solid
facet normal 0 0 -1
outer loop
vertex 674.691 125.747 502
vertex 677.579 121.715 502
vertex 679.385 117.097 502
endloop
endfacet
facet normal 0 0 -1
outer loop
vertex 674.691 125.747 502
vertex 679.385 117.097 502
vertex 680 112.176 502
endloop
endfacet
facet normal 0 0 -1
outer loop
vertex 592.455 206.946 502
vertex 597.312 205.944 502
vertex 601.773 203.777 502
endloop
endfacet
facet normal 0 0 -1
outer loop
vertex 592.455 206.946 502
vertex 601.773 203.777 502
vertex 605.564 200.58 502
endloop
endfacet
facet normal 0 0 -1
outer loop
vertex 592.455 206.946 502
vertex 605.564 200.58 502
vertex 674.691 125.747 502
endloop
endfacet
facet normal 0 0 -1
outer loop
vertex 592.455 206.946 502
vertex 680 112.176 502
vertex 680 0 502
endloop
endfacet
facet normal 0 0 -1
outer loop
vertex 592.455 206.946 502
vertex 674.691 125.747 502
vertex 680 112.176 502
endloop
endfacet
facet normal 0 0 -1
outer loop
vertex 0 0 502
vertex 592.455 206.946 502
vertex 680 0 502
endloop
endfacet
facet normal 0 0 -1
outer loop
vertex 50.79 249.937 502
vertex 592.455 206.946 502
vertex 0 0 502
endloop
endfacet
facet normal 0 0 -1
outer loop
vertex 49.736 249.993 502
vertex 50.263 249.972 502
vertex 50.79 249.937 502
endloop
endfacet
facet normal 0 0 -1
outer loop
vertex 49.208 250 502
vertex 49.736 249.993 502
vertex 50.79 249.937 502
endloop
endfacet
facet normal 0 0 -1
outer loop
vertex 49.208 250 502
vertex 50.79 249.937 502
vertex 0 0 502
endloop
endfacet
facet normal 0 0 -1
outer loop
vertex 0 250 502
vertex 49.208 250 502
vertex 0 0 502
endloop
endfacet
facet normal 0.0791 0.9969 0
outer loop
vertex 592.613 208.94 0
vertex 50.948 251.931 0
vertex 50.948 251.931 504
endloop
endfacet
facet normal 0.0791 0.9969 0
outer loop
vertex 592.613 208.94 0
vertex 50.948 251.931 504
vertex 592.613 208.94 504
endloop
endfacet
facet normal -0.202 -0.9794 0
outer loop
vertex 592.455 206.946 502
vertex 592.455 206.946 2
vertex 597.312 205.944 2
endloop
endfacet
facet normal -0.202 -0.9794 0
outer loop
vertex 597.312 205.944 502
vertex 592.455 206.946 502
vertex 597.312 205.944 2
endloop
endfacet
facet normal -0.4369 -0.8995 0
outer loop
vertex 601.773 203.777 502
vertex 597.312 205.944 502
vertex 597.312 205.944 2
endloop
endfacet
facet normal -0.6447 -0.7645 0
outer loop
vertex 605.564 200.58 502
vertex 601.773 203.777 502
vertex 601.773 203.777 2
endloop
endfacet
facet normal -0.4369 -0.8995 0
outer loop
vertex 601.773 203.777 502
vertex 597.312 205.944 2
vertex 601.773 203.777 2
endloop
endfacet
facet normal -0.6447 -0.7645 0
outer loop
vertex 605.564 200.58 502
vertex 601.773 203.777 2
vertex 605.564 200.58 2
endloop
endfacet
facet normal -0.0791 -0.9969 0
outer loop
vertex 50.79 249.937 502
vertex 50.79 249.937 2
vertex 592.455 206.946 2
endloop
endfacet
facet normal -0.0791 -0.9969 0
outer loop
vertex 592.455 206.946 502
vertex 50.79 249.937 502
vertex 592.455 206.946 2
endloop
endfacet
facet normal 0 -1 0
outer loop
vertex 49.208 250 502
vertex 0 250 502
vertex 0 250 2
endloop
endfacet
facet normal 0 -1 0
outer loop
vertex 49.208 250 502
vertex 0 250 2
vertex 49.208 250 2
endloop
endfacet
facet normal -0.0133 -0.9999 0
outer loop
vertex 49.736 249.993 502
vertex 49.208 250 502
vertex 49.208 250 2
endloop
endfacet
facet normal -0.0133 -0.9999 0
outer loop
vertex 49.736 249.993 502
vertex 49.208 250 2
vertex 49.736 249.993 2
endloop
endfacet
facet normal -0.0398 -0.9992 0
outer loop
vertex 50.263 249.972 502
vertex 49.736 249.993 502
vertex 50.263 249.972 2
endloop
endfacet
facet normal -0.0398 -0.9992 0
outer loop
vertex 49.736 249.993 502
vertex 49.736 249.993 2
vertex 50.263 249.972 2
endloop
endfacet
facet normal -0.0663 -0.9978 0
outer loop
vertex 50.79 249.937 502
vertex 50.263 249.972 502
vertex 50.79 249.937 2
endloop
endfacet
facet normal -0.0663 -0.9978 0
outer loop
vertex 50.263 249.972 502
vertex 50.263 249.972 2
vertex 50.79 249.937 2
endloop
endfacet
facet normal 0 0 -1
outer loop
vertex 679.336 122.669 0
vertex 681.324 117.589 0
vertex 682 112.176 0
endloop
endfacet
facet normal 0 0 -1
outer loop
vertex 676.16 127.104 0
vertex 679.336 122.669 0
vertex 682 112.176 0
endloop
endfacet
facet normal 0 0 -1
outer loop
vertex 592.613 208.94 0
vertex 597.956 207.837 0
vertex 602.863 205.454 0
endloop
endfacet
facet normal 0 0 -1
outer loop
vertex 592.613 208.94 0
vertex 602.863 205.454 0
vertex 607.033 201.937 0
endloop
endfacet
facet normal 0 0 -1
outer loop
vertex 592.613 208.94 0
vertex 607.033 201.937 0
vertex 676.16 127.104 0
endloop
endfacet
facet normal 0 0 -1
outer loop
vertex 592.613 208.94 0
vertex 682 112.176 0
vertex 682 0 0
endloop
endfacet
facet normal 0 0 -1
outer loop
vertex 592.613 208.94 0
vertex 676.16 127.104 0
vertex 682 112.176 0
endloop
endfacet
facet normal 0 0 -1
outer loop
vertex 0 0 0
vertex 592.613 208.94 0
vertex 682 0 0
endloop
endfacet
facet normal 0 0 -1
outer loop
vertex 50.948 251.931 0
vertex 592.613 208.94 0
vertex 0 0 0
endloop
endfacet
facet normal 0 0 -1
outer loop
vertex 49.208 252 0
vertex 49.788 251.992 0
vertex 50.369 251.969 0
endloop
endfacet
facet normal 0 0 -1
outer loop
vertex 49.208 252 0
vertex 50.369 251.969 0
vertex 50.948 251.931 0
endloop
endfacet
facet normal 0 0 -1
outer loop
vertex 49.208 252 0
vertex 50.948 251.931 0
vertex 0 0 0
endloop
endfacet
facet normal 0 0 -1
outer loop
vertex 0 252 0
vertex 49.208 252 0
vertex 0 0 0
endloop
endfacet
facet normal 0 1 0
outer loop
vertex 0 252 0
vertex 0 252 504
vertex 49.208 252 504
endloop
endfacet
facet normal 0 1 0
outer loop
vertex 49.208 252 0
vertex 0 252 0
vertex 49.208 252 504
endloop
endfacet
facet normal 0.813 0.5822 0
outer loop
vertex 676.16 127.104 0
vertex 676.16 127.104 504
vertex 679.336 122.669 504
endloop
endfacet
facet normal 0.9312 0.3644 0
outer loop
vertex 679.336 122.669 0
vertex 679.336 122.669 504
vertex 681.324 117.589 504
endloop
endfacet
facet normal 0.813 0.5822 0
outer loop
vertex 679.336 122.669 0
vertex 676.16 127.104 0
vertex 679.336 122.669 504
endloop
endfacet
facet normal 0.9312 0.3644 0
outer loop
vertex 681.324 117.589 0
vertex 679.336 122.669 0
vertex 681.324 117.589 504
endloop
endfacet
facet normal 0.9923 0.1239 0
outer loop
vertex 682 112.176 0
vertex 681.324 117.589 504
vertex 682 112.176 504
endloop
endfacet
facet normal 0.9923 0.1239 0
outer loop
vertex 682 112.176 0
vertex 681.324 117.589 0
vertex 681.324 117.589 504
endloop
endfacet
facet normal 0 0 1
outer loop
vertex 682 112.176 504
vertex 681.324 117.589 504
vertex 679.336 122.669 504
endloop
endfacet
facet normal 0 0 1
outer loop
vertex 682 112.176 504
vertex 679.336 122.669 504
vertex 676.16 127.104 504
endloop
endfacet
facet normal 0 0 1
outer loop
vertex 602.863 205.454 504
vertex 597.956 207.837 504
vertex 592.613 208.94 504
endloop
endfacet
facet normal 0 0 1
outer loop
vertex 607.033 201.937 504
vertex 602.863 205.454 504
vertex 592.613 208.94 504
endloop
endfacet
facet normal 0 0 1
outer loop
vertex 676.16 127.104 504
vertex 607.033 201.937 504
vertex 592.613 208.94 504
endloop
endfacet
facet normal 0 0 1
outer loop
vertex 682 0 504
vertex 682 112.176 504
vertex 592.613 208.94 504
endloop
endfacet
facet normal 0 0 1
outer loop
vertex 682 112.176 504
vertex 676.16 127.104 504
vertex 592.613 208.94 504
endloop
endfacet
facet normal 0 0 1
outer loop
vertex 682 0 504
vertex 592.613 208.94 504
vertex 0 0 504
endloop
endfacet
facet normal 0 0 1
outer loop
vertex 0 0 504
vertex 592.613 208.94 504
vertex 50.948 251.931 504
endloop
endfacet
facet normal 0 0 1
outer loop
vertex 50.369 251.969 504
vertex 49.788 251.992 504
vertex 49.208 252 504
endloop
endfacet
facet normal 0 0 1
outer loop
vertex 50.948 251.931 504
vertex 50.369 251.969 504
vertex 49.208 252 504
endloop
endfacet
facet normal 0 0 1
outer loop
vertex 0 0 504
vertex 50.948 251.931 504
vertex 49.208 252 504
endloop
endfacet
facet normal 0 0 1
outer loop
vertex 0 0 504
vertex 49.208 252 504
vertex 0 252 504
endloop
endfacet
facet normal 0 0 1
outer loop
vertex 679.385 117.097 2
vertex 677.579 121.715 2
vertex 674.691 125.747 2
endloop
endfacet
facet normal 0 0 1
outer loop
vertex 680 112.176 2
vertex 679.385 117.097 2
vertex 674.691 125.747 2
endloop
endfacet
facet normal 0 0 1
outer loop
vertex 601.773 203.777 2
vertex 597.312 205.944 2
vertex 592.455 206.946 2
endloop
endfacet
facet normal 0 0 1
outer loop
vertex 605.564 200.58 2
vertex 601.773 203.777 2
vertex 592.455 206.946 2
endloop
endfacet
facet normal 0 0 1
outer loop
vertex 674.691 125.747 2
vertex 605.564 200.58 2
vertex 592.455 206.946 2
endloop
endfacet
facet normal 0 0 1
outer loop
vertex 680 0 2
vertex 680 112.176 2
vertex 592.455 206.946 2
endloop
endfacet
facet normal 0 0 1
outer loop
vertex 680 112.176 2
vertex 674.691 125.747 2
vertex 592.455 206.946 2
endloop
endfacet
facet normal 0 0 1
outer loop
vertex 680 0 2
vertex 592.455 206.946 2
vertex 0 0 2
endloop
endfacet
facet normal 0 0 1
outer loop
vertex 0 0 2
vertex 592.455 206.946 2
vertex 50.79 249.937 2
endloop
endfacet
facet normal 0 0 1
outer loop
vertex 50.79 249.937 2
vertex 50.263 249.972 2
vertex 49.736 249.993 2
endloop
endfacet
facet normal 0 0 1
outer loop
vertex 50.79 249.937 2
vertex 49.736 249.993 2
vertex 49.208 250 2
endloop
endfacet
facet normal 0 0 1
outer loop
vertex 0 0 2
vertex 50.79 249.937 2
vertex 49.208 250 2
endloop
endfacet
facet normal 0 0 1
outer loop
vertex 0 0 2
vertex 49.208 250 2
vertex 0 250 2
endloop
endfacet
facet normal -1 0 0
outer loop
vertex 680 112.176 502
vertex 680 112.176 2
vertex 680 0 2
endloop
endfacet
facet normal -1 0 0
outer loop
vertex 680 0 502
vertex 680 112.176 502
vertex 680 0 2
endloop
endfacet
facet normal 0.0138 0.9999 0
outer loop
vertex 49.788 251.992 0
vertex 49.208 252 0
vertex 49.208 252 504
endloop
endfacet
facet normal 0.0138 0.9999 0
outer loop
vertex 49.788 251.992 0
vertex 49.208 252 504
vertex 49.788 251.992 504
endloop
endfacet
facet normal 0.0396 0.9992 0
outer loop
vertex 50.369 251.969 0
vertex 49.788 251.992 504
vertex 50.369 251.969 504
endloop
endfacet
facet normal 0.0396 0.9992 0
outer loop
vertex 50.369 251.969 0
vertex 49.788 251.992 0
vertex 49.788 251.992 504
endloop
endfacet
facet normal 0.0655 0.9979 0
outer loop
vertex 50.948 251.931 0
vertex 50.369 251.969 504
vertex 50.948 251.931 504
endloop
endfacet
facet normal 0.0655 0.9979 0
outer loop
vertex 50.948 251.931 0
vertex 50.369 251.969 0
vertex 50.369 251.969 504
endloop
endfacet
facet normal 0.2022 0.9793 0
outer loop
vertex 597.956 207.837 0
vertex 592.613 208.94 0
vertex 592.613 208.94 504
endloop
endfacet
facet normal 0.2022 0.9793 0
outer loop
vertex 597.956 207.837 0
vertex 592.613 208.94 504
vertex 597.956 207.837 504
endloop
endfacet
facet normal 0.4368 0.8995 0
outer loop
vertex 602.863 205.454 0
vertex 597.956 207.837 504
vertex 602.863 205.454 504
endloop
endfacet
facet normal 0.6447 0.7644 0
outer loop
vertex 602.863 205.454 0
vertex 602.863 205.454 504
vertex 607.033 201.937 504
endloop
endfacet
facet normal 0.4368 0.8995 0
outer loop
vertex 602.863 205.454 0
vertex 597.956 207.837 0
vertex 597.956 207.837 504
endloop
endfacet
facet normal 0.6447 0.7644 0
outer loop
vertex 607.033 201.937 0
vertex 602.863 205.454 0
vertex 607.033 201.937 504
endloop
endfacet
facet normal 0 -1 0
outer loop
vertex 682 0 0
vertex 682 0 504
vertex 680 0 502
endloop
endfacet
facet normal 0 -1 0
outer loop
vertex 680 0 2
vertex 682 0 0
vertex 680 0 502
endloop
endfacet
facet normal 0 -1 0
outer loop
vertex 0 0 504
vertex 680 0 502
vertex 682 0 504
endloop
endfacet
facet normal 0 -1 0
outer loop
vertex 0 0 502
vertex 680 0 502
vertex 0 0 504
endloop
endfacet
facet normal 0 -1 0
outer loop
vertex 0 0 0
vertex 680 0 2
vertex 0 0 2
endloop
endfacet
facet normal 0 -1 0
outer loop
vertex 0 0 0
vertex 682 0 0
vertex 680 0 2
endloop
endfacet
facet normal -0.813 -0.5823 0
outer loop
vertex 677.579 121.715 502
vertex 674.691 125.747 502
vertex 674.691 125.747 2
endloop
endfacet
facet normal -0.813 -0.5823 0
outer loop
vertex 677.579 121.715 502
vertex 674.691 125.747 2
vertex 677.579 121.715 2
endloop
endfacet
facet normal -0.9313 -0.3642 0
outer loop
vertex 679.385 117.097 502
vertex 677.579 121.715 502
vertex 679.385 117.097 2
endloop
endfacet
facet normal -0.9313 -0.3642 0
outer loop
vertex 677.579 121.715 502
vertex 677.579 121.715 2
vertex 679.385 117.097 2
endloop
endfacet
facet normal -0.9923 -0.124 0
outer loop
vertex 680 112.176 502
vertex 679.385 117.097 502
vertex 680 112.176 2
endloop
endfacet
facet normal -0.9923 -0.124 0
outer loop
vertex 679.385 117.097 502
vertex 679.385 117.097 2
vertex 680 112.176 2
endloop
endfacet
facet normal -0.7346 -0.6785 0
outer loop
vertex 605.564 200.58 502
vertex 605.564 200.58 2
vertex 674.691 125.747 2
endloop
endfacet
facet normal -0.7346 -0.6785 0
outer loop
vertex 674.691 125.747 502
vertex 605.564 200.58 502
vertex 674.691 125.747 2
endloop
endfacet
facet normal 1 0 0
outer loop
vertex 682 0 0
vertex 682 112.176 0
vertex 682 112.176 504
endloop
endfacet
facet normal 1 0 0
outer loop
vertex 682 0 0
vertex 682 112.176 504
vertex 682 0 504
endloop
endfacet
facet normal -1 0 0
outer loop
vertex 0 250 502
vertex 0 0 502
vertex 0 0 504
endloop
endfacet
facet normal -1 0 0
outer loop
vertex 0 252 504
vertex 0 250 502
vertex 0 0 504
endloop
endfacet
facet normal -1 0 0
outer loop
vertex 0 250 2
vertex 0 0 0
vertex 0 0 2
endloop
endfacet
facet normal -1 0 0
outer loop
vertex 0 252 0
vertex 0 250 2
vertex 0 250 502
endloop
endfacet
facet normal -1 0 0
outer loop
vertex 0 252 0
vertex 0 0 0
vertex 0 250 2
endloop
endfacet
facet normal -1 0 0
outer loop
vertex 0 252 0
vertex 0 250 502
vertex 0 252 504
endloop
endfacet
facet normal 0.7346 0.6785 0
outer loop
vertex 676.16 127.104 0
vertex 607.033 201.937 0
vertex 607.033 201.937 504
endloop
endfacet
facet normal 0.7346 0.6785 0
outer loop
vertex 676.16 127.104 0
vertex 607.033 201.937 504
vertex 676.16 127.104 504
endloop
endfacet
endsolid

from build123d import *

# Parameters (mm, degrees)
BOSS_EXTRUDE1_DEPTH = 504
SHELL1_T            = -2


with BuildPart() as part:
    # Model → Boss-Extrude1 (new body)
    with BuildSketch(Plane.XY):
        with BuildLine():
            Line((0, 0), (0, 252))
            Line((0, 252), (49.207558746, 252))
            ThreePointArc((49.207558746, 252), (50.07856277, 251.982751238), (50.948201, 251.931032))
            Line((50.948201, 251.931032), (592.613138523, 208.939673232))
            ThreePointArc((592.613138523, 208.939673232), (600.483421158, 206.798288112), (607.032660761, 201.936771925))
            Line((607.032660761, 201.936771925), (676.160164376, 127.104105938))
            ThreePointArc((676.160164376, 127.104105938), (680.488089421, 120.190848365), (682, 112.1759752))
            Line((682, 112.1759752), (682, 0))
            Line((682, 0), (0, 0))
        make_face()
    extrude(amount=BOSS_EXTRUDE1_DEPTH)

    # Shell1
    shell1_openings = [part.faces().sort_by_distance(p)[0] for p in [
        (341, 0, 252),
        (0, 126, 252),
    ]]
    offset(amount=SHELL1_T, openings=shell1_openings, kind=Kind.INTERSECTION)


solid = part.part
